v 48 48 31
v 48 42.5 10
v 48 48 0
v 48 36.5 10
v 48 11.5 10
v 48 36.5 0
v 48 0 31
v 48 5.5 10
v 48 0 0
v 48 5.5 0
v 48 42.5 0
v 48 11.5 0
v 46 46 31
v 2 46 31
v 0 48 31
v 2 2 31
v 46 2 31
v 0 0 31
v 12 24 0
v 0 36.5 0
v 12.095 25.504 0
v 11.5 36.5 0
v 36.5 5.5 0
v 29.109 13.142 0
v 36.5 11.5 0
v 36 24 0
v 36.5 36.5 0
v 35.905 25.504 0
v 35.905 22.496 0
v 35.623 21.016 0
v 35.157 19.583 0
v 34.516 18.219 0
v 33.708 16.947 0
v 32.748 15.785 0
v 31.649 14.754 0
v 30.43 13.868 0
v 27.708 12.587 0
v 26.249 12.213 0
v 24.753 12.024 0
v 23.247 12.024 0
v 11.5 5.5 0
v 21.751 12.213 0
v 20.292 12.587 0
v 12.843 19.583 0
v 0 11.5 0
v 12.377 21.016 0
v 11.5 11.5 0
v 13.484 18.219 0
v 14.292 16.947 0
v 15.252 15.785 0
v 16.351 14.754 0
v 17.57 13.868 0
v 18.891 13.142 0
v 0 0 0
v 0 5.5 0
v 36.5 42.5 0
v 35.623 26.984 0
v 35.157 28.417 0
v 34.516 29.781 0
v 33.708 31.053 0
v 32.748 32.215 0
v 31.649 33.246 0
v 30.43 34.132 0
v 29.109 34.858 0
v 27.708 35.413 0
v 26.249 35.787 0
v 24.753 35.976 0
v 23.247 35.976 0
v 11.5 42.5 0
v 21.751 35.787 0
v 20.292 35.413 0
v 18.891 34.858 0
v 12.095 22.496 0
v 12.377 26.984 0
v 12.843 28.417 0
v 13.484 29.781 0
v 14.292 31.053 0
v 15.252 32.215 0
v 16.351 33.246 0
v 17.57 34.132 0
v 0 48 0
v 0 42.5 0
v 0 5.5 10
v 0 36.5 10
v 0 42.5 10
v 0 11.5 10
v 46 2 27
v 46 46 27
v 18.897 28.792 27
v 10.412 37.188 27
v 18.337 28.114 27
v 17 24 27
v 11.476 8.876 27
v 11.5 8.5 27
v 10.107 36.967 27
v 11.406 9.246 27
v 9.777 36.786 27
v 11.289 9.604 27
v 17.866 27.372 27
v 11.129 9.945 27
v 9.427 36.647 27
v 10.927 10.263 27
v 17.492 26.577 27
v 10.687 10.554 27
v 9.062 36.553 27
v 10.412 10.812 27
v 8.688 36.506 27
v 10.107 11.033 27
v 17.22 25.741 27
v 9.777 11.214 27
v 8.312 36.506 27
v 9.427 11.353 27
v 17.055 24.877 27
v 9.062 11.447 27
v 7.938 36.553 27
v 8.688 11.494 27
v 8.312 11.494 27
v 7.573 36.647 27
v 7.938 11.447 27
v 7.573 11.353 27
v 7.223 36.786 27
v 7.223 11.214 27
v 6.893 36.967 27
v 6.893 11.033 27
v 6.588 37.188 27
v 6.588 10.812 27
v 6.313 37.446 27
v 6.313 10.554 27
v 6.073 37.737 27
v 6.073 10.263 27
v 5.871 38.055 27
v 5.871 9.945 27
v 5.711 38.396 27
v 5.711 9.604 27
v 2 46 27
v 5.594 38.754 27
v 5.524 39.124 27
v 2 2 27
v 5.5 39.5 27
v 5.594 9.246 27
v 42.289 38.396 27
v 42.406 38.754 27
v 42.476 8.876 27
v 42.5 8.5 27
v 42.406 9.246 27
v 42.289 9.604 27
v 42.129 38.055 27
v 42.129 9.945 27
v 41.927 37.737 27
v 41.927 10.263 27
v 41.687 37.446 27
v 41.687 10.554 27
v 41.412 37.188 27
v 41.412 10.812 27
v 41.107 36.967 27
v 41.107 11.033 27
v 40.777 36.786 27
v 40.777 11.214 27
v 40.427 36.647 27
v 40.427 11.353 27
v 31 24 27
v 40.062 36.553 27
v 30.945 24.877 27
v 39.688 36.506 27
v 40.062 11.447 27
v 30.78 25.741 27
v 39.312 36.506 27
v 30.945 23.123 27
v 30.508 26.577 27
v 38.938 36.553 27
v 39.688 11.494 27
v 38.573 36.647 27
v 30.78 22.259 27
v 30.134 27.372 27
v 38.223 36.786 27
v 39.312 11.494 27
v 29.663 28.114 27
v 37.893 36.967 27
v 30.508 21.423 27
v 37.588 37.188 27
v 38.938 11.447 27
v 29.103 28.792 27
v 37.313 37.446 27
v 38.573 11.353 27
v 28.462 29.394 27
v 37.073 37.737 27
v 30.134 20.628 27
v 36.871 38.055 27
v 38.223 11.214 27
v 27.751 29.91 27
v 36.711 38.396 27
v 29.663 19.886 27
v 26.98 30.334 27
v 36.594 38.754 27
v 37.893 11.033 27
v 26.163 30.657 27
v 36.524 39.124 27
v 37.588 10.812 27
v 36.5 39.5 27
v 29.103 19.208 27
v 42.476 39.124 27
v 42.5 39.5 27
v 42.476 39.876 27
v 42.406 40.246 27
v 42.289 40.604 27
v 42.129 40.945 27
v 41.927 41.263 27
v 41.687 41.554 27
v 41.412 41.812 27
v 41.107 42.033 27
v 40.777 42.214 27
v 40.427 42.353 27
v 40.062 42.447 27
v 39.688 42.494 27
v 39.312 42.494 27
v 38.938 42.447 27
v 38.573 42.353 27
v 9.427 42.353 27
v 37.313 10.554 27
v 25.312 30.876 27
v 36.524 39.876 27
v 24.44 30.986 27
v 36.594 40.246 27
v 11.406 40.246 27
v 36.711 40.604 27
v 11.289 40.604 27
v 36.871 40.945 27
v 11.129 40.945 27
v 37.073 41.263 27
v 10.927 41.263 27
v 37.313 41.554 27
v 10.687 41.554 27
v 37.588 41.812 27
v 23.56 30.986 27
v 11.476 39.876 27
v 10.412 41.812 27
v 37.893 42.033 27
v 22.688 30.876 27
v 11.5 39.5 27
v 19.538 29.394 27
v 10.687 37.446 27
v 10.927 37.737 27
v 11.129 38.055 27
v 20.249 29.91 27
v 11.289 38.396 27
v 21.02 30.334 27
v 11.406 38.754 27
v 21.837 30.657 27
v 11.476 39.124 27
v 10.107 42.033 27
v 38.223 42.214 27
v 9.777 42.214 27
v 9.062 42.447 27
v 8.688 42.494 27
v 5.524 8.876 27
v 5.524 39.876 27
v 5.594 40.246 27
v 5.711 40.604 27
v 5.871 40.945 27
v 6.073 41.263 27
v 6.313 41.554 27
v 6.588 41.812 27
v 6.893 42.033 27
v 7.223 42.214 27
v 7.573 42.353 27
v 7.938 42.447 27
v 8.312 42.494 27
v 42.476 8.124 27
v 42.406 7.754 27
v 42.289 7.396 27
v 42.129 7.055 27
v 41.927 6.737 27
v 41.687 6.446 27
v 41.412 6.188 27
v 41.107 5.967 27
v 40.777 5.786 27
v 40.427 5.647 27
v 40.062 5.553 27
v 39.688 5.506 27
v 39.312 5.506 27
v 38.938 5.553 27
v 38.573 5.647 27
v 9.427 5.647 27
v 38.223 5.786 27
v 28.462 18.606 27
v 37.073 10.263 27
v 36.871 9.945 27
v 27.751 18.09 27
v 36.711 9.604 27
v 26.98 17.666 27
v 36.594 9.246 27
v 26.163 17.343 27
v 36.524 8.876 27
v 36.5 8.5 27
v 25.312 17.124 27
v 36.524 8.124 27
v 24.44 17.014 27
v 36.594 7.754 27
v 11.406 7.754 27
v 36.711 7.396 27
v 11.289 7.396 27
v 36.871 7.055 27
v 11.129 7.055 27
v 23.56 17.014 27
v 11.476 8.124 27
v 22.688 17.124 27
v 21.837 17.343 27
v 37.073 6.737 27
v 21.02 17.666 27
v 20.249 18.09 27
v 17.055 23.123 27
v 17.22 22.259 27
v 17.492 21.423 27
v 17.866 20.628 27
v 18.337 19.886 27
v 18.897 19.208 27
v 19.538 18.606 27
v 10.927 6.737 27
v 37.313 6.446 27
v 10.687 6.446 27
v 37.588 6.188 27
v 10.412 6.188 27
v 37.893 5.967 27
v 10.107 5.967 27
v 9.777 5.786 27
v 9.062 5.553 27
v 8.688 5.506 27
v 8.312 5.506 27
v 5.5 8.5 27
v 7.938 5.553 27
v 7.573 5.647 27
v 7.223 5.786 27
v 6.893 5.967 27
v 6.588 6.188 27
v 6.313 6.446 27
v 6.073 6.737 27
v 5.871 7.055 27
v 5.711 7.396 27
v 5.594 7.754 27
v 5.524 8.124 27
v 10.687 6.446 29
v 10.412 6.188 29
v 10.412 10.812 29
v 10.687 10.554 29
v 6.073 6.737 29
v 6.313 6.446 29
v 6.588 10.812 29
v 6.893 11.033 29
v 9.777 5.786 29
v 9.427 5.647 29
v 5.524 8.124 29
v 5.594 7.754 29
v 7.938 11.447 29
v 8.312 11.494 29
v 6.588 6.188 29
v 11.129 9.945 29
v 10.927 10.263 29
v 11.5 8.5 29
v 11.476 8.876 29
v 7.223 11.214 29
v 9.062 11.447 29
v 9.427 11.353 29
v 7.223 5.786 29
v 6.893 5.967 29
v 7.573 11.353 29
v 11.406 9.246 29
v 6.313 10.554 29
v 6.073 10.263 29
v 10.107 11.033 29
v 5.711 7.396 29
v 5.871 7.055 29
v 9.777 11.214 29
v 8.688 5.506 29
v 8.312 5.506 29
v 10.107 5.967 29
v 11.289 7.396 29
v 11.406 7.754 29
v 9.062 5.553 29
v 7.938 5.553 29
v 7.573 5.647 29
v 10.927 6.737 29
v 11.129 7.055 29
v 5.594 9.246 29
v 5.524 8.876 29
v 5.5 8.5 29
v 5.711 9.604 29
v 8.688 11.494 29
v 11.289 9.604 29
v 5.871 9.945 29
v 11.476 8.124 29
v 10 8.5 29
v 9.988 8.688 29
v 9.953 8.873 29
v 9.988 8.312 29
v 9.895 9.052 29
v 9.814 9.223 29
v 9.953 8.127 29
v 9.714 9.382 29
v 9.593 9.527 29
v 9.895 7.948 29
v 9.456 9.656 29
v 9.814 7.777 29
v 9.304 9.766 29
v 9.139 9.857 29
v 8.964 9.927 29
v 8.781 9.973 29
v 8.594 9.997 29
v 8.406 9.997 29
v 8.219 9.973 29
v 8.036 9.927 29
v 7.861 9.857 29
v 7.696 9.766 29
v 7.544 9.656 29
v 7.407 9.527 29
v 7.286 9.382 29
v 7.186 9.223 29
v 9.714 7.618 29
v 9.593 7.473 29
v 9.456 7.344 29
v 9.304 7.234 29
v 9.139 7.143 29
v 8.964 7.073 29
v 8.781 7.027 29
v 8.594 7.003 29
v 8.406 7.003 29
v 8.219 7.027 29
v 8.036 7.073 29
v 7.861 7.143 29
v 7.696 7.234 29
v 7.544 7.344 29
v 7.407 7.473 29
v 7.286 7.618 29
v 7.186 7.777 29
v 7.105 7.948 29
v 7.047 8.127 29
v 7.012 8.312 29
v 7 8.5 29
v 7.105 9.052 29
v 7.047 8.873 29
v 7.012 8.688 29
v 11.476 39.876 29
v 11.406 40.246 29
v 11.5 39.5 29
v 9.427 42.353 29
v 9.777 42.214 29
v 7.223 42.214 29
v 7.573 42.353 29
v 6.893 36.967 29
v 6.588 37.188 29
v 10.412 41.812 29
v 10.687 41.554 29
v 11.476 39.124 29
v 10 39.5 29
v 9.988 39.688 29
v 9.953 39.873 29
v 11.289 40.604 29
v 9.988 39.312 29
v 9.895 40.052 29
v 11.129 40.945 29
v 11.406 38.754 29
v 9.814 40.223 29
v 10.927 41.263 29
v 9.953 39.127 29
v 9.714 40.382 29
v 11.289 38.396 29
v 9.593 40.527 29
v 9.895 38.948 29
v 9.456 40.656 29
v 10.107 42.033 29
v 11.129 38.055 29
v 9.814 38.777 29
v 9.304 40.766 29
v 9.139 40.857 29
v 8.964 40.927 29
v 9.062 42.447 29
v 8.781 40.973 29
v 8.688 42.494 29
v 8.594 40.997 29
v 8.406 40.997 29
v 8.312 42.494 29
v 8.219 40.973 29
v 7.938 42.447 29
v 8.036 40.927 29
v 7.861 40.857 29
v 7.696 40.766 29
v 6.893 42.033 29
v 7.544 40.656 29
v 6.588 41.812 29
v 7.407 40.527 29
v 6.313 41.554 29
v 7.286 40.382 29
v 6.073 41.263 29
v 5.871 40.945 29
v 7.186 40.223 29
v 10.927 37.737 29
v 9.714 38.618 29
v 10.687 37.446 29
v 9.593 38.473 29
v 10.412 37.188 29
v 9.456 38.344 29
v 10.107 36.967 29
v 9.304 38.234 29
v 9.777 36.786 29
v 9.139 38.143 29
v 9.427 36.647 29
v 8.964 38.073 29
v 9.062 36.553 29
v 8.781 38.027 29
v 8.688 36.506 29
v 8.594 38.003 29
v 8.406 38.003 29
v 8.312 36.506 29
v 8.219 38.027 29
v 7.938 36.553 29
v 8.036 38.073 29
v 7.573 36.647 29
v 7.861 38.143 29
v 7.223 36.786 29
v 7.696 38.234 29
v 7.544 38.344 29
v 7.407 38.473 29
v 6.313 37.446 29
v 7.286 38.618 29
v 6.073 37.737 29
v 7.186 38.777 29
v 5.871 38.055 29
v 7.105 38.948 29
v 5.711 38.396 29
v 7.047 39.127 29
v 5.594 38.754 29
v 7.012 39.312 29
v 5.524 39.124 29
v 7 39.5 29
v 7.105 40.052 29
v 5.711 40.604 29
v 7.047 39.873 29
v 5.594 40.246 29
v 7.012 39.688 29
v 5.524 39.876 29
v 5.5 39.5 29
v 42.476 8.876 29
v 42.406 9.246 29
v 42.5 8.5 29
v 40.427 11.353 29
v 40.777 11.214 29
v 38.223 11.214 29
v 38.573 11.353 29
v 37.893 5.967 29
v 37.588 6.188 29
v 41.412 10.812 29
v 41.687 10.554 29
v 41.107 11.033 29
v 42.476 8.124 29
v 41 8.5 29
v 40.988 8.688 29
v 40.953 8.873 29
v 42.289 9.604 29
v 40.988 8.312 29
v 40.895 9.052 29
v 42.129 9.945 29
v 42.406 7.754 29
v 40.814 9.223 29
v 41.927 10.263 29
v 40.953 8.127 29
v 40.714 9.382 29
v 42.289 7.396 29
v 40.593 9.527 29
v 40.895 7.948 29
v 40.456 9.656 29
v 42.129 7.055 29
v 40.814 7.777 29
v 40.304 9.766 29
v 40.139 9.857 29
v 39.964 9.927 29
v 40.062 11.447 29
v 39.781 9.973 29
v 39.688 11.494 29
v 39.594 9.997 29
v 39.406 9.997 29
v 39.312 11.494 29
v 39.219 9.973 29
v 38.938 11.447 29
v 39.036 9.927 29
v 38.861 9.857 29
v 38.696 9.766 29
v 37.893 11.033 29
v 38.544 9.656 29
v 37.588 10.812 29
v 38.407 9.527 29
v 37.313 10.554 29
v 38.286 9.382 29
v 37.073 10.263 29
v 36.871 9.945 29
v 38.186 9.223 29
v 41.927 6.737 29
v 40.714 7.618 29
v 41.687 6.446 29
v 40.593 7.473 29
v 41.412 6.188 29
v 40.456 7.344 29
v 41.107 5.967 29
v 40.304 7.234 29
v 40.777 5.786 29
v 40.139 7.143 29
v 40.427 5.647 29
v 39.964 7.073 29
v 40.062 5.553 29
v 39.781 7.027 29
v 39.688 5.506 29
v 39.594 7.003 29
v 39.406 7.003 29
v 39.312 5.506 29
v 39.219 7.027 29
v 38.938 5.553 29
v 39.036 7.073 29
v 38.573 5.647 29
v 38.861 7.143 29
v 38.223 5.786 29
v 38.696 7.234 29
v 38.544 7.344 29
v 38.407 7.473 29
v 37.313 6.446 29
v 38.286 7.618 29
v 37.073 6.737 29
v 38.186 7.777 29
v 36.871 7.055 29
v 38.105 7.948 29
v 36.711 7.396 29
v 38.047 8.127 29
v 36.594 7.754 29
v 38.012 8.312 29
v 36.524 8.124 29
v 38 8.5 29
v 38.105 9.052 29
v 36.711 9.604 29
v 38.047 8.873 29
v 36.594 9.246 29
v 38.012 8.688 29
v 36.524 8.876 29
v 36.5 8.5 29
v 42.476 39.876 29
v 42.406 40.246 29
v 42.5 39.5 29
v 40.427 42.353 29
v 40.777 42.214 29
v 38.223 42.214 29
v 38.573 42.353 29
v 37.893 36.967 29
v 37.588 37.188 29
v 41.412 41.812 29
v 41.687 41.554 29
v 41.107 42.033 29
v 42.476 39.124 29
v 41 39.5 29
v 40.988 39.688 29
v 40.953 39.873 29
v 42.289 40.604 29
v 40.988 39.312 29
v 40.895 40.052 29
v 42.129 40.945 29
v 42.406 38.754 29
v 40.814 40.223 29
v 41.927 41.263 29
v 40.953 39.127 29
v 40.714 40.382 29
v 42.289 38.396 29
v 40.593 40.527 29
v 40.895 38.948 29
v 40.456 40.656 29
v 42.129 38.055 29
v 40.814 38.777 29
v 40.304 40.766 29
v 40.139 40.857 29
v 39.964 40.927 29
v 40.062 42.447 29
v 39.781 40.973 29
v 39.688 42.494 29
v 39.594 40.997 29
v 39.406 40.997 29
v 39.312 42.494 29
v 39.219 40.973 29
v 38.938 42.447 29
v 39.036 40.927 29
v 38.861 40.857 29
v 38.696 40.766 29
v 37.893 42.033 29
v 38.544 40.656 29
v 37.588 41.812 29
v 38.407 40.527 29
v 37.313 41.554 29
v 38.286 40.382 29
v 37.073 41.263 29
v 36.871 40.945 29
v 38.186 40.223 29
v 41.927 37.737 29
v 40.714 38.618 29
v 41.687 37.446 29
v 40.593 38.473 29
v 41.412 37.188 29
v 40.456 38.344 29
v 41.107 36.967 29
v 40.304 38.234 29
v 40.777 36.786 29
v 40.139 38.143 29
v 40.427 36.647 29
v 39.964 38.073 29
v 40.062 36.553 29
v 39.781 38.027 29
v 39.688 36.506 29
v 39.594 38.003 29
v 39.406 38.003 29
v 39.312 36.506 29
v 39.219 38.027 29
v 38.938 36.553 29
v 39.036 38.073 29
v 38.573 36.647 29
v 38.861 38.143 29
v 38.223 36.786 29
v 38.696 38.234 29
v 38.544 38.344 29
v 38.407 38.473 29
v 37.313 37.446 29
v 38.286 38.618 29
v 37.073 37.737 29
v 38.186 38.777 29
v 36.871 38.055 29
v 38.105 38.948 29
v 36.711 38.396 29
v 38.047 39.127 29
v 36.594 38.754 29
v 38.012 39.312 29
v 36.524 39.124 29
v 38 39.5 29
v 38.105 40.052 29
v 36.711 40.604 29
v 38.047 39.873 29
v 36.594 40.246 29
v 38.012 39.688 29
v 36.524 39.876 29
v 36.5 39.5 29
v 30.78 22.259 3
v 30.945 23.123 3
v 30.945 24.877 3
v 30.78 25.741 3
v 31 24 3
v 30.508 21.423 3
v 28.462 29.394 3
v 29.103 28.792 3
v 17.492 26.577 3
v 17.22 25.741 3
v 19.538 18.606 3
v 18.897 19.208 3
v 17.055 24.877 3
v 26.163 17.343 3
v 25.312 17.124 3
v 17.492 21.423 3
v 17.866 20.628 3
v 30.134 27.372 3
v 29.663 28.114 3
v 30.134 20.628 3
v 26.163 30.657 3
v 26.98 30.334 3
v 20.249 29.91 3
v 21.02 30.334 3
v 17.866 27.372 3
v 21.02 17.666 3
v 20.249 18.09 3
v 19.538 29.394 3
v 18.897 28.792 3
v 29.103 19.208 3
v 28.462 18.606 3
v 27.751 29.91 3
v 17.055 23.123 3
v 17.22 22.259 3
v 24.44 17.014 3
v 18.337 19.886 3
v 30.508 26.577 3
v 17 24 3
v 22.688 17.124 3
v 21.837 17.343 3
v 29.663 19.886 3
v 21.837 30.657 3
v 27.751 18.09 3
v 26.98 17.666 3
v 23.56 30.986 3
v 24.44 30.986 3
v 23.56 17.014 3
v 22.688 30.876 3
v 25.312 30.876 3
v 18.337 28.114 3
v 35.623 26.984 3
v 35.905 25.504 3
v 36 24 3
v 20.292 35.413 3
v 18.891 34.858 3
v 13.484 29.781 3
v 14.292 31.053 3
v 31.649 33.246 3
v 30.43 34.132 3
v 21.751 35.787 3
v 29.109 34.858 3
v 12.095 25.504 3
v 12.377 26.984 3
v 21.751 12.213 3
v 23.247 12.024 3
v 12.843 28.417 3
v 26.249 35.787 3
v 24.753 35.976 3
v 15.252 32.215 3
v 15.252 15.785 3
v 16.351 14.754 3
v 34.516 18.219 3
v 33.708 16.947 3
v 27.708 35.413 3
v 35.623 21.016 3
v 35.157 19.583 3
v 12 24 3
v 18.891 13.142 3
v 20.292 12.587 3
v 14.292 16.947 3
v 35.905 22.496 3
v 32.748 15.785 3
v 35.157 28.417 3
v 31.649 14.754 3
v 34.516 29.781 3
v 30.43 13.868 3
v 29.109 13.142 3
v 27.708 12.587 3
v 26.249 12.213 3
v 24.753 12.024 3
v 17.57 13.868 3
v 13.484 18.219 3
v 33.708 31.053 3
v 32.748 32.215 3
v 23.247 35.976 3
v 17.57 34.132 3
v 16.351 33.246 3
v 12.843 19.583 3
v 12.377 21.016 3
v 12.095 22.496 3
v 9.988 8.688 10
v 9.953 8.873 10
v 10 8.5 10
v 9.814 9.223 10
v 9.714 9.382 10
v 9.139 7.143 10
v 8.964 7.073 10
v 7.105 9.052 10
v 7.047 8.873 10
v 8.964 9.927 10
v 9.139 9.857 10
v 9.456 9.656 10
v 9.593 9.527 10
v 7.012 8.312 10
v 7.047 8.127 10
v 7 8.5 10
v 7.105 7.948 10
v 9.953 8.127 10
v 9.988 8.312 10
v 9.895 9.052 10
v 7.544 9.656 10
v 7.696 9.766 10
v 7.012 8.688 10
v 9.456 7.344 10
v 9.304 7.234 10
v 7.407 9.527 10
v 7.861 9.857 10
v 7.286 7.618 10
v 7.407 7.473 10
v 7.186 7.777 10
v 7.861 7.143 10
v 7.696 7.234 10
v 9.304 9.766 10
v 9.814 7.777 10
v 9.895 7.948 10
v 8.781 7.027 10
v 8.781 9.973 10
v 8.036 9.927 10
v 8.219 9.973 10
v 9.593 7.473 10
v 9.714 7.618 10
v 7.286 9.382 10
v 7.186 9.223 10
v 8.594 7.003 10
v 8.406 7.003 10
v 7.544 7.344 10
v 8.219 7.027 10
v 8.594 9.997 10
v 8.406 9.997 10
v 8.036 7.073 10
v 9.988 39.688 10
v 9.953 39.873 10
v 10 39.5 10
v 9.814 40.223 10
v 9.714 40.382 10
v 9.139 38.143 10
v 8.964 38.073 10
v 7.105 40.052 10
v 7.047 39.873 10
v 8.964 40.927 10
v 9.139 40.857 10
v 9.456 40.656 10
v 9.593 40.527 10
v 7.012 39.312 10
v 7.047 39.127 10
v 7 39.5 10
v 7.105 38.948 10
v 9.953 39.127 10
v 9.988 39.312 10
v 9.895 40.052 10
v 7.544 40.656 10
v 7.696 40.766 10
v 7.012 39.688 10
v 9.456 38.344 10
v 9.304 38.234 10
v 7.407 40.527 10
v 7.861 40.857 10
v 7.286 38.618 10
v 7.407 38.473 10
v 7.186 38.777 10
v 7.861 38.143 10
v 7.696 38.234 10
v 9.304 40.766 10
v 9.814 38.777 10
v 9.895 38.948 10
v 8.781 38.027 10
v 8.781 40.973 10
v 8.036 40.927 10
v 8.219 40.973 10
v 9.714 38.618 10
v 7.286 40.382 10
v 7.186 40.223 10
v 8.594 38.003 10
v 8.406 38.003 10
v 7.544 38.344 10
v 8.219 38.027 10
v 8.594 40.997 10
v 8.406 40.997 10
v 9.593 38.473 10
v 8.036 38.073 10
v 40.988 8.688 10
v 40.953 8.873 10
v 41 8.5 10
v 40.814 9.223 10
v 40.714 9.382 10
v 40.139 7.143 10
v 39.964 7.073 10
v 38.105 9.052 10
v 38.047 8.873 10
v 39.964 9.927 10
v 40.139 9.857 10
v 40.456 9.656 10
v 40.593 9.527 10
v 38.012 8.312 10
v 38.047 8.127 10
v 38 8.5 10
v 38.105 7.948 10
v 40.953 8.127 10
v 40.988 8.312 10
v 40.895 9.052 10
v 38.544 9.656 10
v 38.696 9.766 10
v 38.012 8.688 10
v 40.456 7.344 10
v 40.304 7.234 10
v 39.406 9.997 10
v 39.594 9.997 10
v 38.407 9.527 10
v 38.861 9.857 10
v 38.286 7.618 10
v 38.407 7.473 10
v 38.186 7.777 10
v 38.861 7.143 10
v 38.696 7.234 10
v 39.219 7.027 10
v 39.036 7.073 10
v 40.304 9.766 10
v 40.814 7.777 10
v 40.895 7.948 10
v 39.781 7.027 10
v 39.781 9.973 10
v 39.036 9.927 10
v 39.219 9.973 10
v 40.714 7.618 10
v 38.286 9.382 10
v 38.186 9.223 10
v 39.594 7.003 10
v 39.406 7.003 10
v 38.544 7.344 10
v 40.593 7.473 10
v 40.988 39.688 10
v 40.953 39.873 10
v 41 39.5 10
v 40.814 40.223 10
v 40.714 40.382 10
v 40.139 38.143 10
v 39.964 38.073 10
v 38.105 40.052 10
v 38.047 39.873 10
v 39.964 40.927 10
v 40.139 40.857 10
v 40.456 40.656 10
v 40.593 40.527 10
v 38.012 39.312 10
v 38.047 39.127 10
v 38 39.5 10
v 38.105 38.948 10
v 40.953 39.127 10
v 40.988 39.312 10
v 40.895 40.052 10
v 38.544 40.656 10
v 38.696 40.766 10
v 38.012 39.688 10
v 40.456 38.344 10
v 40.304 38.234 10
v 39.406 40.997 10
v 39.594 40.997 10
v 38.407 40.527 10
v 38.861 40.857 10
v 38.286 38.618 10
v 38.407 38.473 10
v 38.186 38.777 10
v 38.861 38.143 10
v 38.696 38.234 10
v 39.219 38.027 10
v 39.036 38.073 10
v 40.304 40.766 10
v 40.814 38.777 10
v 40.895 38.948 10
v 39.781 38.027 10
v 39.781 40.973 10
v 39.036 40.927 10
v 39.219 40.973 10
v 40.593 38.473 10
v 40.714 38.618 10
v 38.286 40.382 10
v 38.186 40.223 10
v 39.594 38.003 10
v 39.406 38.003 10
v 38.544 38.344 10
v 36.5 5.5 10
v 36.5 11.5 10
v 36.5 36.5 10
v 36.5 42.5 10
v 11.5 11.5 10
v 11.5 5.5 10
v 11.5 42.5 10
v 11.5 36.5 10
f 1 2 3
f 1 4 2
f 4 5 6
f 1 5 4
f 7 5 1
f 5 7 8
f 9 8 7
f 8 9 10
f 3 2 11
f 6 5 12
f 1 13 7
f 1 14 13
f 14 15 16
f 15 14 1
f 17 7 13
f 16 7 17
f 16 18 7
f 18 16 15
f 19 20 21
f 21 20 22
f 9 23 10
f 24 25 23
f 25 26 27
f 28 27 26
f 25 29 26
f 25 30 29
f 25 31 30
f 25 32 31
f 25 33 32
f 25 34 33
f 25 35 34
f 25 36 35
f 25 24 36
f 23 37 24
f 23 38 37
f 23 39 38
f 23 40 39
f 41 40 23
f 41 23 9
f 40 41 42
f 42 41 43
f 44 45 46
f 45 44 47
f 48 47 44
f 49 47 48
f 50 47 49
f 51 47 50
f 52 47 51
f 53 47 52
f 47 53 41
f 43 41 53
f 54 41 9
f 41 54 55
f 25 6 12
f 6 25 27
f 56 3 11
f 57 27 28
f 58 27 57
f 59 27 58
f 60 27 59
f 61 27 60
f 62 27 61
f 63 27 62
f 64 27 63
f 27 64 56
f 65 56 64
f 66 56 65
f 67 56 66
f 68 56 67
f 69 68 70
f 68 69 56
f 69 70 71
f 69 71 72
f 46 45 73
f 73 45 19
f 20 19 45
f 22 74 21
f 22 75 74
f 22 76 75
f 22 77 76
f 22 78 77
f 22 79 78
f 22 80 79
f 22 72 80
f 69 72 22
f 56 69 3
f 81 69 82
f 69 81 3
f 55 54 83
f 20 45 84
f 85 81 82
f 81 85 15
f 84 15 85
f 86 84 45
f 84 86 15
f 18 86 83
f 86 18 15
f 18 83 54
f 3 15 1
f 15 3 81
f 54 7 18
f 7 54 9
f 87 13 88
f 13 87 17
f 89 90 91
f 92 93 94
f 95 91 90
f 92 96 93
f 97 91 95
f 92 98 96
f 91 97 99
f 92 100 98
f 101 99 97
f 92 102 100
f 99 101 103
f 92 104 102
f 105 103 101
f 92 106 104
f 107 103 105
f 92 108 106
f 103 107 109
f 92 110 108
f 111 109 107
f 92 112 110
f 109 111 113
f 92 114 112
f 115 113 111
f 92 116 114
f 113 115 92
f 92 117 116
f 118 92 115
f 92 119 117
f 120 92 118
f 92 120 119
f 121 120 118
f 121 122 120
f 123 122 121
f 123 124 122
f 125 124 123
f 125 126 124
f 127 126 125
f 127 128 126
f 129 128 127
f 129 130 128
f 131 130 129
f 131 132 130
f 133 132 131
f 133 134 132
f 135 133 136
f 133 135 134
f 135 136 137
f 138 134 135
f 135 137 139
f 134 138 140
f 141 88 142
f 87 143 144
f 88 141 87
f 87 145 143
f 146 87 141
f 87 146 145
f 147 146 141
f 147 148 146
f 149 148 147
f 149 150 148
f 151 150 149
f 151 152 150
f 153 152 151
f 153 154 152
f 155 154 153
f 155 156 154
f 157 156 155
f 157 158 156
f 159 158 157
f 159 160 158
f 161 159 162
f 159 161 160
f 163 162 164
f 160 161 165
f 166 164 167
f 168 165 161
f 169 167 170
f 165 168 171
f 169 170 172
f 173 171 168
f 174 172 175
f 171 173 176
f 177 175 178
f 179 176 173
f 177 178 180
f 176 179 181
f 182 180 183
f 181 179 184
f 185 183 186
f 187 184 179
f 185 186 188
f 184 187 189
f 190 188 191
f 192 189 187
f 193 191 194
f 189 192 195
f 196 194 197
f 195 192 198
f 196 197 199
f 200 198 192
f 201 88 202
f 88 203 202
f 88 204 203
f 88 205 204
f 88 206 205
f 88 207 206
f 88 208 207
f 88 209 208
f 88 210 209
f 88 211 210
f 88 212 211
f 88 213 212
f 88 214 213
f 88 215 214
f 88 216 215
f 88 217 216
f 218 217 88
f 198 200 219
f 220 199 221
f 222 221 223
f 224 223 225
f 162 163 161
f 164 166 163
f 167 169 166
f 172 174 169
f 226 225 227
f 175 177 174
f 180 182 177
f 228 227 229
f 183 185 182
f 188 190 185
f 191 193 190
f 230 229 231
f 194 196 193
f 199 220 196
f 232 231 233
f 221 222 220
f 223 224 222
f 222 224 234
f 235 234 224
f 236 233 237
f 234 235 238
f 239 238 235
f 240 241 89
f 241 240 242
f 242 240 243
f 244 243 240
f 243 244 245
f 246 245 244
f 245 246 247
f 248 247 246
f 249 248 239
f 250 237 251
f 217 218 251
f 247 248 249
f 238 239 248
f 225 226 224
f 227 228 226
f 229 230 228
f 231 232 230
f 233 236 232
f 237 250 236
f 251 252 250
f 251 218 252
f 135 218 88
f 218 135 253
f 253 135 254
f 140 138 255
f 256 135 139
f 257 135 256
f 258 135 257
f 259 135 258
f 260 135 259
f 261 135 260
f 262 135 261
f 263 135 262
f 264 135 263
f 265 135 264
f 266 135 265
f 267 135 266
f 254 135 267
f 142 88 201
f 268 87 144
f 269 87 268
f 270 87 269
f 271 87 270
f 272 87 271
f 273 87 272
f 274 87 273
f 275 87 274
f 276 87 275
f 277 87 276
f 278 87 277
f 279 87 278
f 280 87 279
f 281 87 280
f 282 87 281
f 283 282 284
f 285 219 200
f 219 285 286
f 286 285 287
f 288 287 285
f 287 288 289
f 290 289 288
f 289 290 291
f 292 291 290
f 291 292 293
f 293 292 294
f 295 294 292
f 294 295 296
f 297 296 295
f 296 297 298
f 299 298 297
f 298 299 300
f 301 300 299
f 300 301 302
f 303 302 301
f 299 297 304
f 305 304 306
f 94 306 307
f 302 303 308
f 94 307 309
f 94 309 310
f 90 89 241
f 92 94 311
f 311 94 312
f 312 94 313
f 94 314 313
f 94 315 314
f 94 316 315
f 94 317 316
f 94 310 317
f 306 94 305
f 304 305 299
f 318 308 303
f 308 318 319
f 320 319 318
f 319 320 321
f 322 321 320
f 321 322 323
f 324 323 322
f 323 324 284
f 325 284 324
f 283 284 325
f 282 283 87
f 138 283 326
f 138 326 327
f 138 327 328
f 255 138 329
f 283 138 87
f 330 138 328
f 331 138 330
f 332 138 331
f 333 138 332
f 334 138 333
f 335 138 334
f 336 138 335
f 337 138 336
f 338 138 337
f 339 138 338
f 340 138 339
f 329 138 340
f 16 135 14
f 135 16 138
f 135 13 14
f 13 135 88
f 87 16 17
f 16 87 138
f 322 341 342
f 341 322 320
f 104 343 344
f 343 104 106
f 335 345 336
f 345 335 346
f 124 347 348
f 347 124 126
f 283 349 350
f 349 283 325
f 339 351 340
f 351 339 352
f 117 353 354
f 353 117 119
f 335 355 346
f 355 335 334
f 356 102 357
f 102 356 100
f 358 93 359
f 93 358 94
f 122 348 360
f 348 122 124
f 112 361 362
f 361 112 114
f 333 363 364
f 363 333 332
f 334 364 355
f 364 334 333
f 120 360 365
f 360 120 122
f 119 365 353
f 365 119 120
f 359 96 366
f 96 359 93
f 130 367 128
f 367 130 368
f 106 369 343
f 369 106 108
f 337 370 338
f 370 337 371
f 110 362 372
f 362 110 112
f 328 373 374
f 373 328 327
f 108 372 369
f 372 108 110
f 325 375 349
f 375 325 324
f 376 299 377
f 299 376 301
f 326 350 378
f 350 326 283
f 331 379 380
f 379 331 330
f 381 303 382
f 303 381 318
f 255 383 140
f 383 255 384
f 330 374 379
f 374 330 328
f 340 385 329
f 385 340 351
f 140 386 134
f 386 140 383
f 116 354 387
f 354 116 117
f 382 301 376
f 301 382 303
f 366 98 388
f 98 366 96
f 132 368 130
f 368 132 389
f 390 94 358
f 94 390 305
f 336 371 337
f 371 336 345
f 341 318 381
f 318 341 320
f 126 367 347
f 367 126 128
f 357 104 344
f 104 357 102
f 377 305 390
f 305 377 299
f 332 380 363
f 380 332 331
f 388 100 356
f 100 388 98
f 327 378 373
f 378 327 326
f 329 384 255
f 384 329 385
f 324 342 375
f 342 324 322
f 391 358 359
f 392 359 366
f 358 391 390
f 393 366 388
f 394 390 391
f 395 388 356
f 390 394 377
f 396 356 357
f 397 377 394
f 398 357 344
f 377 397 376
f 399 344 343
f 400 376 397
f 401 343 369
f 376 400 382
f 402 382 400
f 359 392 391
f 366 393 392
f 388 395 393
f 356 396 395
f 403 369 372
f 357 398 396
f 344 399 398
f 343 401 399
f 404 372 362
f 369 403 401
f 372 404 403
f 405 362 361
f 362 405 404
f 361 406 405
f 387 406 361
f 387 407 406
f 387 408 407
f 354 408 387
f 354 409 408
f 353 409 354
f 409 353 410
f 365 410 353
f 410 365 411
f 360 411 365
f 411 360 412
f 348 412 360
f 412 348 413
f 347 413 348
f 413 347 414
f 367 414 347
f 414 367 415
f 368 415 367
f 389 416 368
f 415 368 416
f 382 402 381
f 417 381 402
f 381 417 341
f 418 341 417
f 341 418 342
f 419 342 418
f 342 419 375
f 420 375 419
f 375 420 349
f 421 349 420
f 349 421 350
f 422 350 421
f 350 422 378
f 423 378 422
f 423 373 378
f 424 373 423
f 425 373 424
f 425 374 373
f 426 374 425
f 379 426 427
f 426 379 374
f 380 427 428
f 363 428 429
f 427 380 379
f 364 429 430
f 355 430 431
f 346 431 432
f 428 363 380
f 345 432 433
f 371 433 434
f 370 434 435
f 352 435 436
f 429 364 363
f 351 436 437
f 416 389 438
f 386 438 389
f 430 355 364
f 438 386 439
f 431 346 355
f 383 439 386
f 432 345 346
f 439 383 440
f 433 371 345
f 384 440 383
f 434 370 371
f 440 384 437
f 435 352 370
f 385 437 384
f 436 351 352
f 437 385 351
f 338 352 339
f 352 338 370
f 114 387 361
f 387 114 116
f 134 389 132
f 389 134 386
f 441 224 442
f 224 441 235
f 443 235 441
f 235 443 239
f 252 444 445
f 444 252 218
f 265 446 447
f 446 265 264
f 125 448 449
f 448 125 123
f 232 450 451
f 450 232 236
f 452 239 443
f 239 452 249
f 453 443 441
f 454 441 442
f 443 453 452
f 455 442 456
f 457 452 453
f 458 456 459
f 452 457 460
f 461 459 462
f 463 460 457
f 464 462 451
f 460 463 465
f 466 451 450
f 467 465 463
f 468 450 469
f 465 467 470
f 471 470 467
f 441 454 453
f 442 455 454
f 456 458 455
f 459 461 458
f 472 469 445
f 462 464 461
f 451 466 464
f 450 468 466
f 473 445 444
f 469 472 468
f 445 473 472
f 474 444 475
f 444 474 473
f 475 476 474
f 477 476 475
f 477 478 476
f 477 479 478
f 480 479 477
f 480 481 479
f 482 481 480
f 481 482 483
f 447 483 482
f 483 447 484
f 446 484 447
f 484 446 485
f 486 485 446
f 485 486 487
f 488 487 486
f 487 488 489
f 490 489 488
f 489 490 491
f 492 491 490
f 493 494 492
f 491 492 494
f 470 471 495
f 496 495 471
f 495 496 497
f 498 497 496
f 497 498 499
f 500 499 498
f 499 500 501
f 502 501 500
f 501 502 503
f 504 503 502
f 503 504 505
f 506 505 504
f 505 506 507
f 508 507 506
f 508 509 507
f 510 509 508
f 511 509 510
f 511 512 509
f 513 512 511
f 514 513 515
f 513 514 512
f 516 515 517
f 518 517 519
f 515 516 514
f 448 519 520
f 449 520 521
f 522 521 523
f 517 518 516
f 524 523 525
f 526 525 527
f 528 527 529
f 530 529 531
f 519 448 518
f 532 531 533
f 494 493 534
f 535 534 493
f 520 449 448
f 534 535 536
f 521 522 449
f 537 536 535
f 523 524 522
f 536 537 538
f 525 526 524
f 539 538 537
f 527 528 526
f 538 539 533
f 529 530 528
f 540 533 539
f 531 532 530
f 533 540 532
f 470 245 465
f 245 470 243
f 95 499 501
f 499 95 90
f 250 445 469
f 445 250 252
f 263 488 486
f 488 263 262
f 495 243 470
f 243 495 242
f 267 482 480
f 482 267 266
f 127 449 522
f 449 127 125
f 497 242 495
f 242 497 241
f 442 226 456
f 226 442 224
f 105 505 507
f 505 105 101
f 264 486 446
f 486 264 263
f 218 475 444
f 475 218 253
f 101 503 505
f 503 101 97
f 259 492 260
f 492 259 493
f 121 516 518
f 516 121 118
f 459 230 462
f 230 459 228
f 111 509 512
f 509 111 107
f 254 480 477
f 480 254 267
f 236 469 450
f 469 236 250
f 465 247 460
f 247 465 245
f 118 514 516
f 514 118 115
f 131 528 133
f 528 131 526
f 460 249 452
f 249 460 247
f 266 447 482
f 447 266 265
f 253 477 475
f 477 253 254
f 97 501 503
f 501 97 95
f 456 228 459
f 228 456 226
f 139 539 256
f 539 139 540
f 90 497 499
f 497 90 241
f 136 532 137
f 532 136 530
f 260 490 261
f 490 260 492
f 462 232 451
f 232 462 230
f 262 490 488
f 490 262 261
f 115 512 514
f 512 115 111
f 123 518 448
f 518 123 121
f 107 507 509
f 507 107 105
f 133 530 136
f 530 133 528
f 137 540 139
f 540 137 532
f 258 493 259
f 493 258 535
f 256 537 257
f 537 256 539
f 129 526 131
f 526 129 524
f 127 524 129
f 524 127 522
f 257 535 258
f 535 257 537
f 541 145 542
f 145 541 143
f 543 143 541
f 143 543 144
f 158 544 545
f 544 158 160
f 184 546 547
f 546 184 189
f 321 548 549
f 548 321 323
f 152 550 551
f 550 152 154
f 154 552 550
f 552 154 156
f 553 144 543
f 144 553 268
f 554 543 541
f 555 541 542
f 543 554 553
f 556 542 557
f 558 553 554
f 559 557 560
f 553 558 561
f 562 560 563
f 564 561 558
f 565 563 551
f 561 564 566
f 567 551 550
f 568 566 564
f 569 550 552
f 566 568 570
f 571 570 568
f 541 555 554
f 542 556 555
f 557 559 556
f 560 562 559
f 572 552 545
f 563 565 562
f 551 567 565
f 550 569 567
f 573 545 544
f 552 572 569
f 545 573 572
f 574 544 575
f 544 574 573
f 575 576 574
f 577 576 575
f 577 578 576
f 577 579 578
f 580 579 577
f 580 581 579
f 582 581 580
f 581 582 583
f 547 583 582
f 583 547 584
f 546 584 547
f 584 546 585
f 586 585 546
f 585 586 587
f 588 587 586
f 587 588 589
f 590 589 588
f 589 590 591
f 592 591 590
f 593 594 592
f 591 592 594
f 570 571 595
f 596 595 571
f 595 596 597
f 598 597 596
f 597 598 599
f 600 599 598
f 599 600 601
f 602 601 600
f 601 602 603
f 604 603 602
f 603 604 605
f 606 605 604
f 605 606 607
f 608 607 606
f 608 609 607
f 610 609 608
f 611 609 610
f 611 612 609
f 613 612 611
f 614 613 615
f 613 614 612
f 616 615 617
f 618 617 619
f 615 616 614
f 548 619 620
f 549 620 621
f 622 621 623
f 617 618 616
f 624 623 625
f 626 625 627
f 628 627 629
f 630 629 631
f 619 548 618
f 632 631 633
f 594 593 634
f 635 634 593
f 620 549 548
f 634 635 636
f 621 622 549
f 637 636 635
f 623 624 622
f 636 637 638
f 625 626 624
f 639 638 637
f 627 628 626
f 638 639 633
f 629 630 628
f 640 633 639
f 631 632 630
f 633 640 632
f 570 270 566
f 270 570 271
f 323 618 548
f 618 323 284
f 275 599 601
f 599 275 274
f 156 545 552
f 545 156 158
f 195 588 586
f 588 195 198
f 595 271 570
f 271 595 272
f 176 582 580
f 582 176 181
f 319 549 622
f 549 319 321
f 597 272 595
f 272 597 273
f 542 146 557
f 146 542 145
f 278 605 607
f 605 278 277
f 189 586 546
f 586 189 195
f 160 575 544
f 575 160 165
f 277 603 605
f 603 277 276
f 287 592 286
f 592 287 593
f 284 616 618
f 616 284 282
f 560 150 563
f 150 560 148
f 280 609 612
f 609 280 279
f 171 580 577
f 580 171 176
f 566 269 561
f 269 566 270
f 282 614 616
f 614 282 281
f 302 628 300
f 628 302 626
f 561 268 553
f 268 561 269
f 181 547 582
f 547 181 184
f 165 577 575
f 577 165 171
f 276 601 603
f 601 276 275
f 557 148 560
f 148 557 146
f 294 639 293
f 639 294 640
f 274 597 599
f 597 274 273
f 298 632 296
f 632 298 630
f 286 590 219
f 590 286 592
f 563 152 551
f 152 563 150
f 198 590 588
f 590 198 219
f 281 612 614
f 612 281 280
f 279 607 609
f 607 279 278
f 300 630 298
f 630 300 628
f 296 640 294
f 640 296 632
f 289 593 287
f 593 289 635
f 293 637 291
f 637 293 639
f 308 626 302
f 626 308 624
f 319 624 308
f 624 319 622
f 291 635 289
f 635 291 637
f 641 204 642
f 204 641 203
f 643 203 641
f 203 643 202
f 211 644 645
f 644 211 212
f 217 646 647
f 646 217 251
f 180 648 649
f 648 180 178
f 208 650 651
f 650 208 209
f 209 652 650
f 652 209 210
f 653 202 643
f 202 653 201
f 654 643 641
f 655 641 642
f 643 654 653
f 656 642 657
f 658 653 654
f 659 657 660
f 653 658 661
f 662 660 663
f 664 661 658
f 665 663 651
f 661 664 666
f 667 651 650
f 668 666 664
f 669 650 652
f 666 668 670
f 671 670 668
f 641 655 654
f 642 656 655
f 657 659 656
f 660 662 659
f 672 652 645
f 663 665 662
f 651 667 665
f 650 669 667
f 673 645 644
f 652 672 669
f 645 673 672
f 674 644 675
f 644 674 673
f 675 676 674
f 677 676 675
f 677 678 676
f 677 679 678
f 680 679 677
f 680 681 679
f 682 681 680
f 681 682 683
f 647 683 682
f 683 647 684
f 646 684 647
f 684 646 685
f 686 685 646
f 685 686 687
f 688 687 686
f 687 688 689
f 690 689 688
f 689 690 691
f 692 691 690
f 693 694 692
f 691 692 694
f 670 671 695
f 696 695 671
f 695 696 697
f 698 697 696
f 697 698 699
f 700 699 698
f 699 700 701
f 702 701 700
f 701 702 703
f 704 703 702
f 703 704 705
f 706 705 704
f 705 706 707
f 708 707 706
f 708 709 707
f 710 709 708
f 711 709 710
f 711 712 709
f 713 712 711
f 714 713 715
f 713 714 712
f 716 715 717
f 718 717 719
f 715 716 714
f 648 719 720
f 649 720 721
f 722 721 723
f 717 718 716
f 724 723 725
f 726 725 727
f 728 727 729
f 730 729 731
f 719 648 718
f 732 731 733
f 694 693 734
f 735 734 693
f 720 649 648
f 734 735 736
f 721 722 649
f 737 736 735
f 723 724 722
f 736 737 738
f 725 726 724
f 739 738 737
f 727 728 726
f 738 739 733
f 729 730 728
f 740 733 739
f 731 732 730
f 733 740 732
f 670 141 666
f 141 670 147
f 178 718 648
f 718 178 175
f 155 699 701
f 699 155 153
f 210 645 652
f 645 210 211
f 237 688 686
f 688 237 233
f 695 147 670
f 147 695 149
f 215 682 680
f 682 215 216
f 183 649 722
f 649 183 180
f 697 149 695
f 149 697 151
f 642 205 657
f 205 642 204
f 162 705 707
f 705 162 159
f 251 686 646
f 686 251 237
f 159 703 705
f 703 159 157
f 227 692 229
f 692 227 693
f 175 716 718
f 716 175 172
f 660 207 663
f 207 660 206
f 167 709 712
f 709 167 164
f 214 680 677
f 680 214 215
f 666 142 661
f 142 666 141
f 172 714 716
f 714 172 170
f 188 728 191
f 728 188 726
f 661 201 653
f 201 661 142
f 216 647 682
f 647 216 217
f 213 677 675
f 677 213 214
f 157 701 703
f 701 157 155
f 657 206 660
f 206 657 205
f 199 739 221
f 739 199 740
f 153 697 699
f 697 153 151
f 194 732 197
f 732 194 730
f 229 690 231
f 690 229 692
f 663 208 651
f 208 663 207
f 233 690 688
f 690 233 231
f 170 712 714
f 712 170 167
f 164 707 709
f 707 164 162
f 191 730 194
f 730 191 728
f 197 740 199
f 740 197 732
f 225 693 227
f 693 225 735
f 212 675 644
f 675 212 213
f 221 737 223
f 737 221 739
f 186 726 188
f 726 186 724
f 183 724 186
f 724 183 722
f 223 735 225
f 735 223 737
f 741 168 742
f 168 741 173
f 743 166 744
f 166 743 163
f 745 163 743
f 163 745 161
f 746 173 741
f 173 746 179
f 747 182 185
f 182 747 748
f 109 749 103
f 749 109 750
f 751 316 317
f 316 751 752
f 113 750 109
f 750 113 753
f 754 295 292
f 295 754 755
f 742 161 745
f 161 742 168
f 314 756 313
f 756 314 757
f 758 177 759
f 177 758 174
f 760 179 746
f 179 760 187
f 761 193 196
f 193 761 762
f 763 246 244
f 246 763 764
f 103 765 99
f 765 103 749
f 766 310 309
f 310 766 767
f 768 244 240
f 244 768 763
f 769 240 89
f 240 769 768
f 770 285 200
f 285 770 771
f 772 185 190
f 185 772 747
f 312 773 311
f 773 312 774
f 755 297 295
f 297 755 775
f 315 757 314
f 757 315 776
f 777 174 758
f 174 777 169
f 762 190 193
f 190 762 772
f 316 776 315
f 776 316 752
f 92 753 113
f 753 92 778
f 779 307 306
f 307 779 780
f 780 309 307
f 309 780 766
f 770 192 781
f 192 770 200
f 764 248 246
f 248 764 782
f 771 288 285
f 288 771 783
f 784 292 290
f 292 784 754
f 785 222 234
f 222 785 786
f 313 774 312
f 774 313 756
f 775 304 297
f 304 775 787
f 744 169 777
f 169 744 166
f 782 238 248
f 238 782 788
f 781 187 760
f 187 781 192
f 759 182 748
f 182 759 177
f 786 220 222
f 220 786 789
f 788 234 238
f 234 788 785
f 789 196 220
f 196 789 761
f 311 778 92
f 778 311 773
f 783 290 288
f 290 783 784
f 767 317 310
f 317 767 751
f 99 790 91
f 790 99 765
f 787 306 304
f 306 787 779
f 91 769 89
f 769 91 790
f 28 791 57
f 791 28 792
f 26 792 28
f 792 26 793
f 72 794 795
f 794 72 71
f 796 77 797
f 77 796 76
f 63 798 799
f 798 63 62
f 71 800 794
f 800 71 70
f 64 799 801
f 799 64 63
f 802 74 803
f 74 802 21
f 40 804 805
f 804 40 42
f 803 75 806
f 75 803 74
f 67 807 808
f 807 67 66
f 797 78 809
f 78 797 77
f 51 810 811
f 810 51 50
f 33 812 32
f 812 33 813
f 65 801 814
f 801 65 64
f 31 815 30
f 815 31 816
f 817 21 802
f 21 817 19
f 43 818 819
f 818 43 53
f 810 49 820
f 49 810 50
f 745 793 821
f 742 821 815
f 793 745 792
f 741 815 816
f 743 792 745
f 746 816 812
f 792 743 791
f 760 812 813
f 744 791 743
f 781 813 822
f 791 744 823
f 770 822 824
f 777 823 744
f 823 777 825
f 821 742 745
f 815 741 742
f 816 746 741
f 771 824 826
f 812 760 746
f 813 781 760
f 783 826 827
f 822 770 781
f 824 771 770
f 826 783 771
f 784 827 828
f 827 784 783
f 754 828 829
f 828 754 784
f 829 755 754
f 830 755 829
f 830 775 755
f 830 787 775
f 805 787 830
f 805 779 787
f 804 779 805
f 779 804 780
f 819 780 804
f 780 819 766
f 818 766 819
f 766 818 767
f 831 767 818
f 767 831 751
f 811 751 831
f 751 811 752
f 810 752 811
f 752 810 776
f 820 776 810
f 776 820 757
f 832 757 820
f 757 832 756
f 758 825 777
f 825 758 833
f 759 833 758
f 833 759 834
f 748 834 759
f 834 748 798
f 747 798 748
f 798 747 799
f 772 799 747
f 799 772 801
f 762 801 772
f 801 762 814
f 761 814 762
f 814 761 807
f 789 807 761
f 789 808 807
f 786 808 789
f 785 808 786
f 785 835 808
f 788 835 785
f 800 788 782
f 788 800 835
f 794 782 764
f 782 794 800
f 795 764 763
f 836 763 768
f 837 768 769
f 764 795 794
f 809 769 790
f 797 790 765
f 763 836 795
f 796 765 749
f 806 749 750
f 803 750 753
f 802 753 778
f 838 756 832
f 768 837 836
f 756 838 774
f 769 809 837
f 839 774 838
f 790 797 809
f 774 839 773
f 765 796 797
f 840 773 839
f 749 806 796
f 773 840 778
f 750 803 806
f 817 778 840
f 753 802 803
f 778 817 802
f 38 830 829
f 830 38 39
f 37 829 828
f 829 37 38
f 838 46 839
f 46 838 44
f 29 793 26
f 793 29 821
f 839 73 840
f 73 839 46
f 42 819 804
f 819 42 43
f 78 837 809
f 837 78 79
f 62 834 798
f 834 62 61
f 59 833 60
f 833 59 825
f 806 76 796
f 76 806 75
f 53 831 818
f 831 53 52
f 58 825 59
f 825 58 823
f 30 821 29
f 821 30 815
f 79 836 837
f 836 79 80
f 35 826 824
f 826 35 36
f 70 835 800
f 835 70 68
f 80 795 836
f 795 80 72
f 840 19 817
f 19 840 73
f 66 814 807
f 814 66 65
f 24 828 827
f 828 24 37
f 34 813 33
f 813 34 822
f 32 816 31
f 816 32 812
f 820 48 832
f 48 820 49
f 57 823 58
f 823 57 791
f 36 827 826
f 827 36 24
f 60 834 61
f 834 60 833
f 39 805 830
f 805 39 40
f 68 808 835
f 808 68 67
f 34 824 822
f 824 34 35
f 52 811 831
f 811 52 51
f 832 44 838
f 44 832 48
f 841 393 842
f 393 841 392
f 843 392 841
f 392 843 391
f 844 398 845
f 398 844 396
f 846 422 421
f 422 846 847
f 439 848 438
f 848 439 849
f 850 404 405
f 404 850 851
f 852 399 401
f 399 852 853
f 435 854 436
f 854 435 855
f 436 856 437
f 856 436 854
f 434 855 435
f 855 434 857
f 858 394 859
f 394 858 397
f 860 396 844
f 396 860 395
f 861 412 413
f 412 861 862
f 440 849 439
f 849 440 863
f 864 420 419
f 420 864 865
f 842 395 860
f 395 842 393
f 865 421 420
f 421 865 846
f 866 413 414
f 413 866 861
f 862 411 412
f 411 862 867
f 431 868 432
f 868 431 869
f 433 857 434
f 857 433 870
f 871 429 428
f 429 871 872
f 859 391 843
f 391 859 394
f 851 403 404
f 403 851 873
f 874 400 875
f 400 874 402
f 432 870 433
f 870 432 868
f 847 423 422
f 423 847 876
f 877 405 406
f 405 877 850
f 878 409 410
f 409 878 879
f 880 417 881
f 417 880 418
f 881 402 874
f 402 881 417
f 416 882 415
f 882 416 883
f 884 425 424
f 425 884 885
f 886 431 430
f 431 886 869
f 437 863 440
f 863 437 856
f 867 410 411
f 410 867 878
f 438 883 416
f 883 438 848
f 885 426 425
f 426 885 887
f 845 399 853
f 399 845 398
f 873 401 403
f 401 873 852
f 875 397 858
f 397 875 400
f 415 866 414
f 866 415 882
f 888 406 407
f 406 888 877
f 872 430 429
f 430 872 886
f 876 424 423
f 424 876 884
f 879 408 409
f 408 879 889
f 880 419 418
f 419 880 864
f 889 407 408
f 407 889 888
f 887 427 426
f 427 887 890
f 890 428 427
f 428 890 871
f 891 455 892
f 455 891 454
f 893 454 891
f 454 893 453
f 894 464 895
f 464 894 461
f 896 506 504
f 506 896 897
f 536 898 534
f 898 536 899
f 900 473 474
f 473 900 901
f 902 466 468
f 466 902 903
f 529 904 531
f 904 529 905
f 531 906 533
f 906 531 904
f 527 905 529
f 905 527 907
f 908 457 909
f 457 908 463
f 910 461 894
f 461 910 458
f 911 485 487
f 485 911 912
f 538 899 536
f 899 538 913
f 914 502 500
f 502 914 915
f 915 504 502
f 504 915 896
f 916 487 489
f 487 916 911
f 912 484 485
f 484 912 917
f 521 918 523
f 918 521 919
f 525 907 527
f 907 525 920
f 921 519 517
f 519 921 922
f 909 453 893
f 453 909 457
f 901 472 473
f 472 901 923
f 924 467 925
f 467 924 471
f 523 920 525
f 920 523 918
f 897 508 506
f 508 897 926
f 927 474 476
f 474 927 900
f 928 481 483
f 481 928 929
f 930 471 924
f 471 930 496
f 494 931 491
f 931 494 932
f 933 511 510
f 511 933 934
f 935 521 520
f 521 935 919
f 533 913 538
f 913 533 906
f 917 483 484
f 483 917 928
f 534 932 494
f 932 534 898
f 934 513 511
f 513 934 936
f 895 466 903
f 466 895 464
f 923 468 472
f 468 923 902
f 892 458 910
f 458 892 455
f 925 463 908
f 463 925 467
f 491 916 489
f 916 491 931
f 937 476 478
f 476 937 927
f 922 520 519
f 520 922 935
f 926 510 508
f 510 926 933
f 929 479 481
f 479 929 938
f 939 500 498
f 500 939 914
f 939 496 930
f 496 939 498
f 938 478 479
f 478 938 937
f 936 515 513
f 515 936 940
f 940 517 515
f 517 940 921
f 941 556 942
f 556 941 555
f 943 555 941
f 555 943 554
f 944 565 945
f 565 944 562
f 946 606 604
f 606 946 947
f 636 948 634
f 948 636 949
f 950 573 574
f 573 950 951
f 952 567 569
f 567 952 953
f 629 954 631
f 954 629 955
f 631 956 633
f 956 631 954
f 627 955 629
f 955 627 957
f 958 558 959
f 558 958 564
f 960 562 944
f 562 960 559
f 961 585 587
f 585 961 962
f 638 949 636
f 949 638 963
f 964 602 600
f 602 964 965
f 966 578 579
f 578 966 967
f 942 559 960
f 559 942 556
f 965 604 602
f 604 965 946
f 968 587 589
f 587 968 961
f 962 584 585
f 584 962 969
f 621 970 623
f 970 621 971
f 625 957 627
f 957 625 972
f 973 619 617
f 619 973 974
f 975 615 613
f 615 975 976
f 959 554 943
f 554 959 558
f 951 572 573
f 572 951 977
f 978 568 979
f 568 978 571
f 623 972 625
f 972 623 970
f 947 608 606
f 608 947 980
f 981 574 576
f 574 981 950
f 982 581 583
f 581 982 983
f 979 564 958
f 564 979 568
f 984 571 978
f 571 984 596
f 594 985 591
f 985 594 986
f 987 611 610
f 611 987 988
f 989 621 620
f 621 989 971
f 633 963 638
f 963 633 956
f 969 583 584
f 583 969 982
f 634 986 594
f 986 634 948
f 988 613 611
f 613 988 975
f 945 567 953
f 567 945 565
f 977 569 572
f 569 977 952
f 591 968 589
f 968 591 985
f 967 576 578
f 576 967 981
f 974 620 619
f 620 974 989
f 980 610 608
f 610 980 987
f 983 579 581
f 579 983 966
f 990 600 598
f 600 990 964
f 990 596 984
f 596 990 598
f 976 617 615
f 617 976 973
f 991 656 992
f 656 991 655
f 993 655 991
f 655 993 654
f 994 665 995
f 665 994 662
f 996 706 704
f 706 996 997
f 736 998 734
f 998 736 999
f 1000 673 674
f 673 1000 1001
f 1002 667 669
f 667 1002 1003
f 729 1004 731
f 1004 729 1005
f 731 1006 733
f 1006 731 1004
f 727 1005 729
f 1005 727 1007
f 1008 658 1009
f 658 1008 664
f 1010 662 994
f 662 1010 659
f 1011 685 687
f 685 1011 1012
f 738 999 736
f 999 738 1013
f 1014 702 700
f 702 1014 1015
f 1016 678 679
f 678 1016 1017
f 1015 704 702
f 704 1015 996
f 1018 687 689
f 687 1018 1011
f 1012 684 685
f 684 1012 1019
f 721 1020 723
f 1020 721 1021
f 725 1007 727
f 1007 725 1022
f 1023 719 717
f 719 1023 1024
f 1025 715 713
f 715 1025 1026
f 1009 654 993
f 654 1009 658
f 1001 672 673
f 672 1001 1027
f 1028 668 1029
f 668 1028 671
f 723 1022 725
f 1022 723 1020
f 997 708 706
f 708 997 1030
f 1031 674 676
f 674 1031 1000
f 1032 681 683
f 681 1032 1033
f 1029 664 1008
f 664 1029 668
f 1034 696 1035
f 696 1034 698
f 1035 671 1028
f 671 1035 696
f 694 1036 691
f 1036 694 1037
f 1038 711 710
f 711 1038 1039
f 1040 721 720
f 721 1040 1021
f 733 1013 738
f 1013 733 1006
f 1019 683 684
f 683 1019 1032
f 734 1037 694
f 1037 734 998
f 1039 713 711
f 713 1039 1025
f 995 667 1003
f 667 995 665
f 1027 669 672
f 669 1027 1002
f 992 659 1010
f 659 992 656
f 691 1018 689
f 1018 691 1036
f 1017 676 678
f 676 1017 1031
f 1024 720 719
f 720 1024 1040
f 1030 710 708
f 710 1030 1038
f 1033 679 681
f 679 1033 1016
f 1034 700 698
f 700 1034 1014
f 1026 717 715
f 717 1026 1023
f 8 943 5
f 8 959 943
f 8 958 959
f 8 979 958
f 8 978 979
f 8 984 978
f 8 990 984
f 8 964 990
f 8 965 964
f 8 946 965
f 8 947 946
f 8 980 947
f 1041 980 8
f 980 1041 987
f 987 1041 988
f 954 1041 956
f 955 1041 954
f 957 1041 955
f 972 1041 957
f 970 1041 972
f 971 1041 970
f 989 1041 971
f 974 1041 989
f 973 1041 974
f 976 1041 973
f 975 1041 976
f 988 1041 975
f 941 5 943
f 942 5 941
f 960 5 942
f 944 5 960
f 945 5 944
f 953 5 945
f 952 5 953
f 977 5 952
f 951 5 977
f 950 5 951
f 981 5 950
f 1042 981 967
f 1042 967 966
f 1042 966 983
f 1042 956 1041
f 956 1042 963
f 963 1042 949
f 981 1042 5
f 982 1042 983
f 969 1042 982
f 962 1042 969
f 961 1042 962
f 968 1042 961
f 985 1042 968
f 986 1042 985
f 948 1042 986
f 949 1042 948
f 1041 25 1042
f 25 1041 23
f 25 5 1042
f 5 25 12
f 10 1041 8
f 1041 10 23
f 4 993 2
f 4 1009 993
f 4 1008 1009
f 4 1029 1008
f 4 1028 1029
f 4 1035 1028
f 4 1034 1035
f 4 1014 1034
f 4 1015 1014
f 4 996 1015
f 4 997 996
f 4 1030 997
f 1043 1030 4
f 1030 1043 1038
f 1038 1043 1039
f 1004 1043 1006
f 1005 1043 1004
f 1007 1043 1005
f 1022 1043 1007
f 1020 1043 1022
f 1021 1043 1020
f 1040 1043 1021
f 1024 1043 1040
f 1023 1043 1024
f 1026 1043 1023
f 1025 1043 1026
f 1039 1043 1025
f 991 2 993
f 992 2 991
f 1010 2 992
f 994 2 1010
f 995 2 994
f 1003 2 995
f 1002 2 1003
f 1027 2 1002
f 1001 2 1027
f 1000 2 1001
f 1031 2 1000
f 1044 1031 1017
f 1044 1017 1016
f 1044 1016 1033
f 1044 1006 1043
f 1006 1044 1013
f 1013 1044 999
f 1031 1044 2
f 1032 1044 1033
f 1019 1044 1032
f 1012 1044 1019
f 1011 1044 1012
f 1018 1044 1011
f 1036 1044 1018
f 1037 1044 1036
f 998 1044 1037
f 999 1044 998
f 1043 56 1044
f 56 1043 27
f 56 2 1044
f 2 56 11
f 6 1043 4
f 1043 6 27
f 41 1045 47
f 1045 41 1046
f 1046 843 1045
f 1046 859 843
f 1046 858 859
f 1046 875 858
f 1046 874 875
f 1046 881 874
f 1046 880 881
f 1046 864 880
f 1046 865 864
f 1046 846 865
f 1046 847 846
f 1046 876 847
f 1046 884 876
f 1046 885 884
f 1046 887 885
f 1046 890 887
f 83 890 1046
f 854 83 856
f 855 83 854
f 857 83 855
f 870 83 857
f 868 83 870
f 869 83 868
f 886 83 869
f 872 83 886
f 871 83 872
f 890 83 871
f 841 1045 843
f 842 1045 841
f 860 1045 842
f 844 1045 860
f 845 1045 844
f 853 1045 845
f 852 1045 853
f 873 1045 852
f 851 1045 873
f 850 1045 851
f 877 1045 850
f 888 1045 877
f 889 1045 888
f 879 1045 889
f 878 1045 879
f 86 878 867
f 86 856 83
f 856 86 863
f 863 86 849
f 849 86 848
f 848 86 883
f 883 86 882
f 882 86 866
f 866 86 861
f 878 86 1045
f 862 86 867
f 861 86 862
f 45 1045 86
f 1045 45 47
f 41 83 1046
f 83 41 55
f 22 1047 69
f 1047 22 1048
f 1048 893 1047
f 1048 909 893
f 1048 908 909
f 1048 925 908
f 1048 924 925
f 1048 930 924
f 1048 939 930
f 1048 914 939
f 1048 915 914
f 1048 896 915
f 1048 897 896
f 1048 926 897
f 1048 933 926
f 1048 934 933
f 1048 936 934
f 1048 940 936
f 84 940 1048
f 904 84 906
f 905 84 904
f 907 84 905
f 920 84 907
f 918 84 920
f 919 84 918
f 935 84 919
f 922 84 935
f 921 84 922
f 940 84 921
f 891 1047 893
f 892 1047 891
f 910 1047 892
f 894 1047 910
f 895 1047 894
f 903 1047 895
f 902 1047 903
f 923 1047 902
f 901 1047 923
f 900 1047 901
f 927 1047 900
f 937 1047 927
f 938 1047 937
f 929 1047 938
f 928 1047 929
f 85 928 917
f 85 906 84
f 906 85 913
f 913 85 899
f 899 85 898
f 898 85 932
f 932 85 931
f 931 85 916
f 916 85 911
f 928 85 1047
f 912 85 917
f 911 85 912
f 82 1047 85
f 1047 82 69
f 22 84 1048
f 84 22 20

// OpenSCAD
// Charlie Waters
// Team 3499
// Shaft Encoder Mount


$fn = 50;


sqwidth = 48;
sqheight = 31;

edget = 2;
insetd = 4;

holesd = 31;
screwch = 10;
screwcw = 6;

function center() = sqwidth/2;
function edgeholed() = sqwidth/2-holesd/2;
function spacerh() = sqheight - insetd + 2;

difference(){
	union(){
		difference(){
			cube([sqwidth, sqwidth, sqheight]);
			translate([edget, edget, sqheight-insetd])
				cube([sqwidth-edget*2, sqwidth-edget*2, insetd]);
		}
		translate([center()-holesd/2, center()-holesd/2, 0]) cylinder(spacerh(), 3, 3);
		translate([center()-holesd/2, center()+holesd/2, 0]) cylinder(spacerh(), 3, 3);
		translate([center()+holesd/2, center()-holesd/2, 0]) cylinder(spacerh(), 3, 3);
		translate([center()+holesd/2, center()+holesd/2, 0]) cylinder(spacerh(), 3, 3);
	}

	translate([center(), center(), 0]){
		cylinder(40, 7, 7);
		cylinder(3, 12, 12);
	}

	translate([center()-holesd/2, center()-holesd/2, 0]) cylinder(sqheight, 1.5, 1.5);
	translate([center()-holesd/2, center()+holesd/2, 0]) cylinder(sqheight, 1.5, 1.5);
	translate([center()+holesd/2, center()-holesd/2, 0]) cylinder(sqheight, 1.5, 1.5);
	translate([center()+holesd/2, center()+holesd/2, 0]) cylinder(sqheight, 1.5, 1.5);

	translate([sqwidth-(edgeholed()+screwcw/2), edgeholed()-screwcw/2, 0]){
		cube([edgeholed()+screwcw/2+1, screwcw, screwch]);
	}
	translate([sqwidth-(edgeholed()+screwcw/2), edgeholed()-screwcw/2+holesd, 0]){
		cube([edgeholed()+screwcw/2, screwcw, screwch]);
	}
	translate([0, edgeholed()-screwcw/2, 0]){
		cube([edgeholed()+screwcw/2, screwcw, screwch]);
	}
	translate([0, edgeholed()-screwcw/2+holesd, 0]){
		cube([edgeholed()+screwcw/2, screwcw, screwch]);
	}


}
